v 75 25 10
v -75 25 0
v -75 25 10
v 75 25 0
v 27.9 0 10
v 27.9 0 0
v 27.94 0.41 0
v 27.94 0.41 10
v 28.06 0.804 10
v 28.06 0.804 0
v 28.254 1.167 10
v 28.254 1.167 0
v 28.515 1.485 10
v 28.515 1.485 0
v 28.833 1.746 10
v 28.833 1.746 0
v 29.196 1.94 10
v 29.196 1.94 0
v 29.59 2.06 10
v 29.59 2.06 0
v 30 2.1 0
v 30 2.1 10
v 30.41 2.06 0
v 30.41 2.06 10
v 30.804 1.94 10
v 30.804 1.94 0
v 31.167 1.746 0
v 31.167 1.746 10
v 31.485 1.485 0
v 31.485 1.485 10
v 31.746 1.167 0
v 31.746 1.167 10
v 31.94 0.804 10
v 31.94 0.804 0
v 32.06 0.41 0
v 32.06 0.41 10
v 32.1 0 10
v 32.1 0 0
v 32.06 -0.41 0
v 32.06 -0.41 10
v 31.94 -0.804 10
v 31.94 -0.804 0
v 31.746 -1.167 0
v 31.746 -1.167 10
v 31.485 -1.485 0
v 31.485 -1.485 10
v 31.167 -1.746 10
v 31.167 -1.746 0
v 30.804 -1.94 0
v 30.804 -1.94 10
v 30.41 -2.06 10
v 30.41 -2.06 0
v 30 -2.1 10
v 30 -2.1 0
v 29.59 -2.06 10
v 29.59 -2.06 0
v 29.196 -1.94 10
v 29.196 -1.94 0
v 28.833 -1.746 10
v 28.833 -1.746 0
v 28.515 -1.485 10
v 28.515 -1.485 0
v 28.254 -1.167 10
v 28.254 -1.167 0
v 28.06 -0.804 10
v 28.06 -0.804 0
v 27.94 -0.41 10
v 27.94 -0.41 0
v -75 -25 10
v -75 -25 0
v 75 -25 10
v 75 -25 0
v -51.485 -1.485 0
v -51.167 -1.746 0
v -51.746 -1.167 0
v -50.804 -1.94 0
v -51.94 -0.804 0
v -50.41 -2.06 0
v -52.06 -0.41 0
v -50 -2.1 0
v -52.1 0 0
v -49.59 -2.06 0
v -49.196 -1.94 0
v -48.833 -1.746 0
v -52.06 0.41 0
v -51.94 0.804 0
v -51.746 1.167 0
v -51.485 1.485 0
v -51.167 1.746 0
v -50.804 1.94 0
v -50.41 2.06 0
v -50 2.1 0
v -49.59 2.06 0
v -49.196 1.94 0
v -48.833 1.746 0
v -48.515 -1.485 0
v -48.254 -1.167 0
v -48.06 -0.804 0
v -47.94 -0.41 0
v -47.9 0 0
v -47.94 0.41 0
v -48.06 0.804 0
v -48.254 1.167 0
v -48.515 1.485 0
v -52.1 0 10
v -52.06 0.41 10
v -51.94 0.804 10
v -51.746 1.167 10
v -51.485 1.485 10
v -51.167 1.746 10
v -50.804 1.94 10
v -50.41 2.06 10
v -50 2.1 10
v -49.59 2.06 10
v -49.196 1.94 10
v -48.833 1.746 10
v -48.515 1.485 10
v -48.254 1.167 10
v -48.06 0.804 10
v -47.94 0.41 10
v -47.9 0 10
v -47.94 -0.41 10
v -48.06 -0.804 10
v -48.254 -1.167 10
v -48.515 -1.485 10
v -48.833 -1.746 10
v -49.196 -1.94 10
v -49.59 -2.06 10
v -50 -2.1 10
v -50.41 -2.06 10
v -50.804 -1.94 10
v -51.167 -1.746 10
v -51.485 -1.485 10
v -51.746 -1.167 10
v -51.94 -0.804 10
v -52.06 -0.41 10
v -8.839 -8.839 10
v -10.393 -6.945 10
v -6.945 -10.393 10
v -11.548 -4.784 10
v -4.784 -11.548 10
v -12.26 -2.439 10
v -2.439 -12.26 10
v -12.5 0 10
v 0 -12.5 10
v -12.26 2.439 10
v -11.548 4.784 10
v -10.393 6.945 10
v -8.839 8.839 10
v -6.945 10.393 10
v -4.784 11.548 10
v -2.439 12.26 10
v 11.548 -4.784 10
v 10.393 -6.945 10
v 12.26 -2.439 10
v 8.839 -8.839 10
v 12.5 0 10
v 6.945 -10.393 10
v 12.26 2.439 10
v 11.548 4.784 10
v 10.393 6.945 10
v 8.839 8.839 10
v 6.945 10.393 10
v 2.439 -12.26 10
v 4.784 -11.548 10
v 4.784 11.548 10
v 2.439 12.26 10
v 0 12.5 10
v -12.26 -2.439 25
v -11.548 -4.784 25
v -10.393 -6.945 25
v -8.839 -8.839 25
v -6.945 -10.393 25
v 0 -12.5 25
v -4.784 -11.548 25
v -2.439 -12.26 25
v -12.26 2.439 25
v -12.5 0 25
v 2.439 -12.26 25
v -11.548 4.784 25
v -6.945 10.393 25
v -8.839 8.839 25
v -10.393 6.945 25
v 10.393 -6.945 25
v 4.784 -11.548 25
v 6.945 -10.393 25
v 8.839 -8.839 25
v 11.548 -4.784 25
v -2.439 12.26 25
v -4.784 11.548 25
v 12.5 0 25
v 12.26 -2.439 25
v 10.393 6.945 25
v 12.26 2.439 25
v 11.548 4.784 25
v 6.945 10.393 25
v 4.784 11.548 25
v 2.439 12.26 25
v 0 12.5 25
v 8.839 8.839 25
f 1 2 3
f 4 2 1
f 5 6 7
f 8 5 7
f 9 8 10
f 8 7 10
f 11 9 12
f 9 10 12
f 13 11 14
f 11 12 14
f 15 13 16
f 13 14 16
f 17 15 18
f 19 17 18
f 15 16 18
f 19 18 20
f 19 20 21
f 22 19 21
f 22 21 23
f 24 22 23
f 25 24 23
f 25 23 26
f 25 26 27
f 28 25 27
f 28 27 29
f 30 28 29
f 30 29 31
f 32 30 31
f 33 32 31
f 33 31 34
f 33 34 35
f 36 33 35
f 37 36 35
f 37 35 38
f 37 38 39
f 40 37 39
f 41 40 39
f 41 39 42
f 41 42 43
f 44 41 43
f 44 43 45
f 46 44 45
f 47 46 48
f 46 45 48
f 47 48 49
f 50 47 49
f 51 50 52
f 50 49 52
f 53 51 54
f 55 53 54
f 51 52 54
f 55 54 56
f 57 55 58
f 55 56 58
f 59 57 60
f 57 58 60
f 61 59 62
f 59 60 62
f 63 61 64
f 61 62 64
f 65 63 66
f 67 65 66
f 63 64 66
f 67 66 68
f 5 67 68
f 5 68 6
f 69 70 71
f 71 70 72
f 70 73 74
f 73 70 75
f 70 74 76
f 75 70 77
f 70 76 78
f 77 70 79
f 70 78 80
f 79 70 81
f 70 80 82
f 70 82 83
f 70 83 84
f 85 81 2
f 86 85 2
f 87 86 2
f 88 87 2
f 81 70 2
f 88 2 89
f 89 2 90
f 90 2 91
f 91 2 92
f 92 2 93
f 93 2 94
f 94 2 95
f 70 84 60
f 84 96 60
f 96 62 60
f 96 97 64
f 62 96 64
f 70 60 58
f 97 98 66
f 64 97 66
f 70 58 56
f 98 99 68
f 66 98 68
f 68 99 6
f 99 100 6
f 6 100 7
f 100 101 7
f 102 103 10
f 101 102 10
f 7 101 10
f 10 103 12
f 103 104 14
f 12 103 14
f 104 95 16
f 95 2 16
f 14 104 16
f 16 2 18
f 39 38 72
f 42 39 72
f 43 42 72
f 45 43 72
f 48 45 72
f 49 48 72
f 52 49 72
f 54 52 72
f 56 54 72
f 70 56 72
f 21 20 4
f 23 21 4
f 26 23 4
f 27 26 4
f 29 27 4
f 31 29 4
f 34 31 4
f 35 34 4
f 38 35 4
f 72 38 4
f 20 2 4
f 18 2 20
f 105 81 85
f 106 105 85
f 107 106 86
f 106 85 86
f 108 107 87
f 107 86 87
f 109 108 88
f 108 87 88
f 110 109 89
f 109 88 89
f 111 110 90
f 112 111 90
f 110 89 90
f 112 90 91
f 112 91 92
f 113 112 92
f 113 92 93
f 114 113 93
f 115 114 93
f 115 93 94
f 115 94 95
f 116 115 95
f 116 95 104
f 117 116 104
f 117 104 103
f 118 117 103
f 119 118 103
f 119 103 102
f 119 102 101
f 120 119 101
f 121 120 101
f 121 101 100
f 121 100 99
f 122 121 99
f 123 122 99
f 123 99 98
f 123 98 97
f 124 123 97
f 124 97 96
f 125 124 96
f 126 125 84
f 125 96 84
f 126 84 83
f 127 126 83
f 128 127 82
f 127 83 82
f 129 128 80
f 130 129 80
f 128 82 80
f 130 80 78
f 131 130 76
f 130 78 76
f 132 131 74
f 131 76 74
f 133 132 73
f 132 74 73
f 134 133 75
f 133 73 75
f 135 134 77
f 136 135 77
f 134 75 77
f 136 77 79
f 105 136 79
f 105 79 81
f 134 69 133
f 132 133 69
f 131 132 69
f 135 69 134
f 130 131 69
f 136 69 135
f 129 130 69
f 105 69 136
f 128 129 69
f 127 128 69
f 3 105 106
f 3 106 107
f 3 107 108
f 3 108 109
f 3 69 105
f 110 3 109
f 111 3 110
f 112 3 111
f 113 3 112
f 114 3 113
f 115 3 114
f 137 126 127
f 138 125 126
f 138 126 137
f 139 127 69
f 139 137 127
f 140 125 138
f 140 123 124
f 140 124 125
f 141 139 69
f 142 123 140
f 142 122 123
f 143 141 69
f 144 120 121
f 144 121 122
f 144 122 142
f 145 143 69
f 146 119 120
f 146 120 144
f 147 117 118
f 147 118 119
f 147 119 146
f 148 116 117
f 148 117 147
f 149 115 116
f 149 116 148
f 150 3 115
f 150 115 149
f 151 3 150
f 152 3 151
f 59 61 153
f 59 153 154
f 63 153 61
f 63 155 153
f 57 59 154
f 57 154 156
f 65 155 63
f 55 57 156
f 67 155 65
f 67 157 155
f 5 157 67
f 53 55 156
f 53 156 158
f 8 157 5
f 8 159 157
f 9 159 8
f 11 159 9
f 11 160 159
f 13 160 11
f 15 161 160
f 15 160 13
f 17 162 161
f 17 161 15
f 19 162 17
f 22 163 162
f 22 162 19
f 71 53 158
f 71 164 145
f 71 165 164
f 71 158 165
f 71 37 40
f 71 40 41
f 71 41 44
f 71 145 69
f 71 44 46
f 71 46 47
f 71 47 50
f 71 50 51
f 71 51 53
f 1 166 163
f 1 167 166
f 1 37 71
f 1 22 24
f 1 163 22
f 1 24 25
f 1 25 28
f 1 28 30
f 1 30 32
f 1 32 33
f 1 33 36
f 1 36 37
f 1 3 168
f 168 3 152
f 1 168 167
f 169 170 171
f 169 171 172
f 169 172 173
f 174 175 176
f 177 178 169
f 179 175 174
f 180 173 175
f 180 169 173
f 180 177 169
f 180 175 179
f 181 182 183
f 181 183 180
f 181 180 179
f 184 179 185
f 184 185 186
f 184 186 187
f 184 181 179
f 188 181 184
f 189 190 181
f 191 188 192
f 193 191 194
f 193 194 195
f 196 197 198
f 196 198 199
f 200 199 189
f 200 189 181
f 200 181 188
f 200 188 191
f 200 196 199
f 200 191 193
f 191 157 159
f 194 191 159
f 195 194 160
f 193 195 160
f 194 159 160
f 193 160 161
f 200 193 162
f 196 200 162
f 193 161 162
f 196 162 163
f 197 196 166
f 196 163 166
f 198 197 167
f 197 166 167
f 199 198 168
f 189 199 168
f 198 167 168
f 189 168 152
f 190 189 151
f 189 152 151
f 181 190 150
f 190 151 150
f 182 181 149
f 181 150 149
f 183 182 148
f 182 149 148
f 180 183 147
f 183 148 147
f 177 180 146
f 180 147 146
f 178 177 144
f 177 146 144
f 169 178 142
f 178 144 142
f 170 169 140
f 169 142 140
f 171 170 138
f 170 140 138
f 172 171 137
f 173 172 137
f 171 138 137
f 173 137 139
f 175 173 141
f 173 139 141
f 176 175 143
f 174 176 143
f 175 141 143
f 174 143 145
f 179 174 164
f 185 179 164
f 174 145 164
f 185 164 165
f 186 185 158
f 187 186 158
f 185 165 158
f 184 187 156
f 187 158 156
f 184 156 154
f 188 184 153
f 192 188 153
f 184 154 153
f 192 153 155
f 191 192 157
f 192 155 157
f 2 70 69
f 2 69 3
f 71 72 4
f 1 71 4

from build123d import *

# Parameters (mm, degrees)
F0_W     = 150
F0_H     = 50
F1_DEPTH = 10
F2_R     = 12.5
F3_DEPTH = 15
F5_D     = 4.2


with BuildPart() as f1:
    # F0 (on Top) → F1 (new body)
    with BuildSketch(Plane.XY):
        Rectangle(F0_W, F0_H)
    extrude(amount=F1_DEPTH)

    # F2 (on face) → F3 (join)
    with BuildSketch(Plane.XY.offset(10)):
        Circle(F2_R)
    extrude(amount=F3_DEPTH)

    # F5 (through all)
    with Locations(Plane.XY.offset(10)):
        with Locations((-50, 0), (30, 0)):
            Hole(F5_D / 2)


solid = f1.part
